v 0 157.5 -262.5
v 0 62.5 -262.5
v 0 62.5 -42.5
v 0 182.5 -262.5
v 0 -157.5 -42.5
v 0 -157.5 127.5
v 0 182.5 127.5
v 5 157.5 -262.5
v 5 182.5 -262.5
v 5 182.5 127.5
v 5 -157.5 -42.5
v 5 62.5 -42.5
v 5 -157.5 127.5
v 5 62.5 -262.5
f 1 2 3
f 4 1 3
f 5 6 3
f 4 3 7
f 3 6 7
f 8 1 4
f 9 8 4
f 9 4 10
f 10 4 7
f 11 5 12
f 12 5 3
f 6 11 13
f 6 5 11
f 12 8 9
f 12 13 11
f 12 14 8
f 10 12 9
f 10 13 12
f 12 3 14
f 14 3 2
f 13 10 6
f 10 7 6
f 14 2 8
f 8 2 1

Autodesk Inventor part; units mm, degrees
ref_plane "YZ Plane" through (0, 0, 0) normal (1, 0, 0) x (0, 1, 0)
ref_plane "XZ Plane" through (0, 0, 0) normal (0, 1, 0) x (-1, 0, 0)
ref_plane "XY Plane" through (0, 0, 0) normal (0, 0, 1) x (1, 0, 0)
sketch "Sketch1" plane through (0, 0, 0) normal (1, 0, 0) x (0, 1, 0)
  line L0 (-157.5, -42.5) -> (62.5, -42.5)
  line L1 (62.5, -42.5) -> (62.5, -262.5)
  line L2 (62.5, -262.5) -> (157.5, -262.5)
  line L3 (-157.5, -42.5) -> (-157.5, 127.5)
  line L4 (182.5, 127.5) -> (-157.5, 127.5)
  line L5 (62.5, -262.5) -> (182.5, -262.5)
  line L6 (182.5, -262.5) -> (182.5, 127.5)
  point P0 (0, 0)
  point P1 (157.5, 127.5)
  dimension "d8" = 170
  dimension "d9" = 120
extrude "Extrusion1" add sketch "Sketch1" along normal blind 5
properties part number "Side Part" material "Pine, Southern"
